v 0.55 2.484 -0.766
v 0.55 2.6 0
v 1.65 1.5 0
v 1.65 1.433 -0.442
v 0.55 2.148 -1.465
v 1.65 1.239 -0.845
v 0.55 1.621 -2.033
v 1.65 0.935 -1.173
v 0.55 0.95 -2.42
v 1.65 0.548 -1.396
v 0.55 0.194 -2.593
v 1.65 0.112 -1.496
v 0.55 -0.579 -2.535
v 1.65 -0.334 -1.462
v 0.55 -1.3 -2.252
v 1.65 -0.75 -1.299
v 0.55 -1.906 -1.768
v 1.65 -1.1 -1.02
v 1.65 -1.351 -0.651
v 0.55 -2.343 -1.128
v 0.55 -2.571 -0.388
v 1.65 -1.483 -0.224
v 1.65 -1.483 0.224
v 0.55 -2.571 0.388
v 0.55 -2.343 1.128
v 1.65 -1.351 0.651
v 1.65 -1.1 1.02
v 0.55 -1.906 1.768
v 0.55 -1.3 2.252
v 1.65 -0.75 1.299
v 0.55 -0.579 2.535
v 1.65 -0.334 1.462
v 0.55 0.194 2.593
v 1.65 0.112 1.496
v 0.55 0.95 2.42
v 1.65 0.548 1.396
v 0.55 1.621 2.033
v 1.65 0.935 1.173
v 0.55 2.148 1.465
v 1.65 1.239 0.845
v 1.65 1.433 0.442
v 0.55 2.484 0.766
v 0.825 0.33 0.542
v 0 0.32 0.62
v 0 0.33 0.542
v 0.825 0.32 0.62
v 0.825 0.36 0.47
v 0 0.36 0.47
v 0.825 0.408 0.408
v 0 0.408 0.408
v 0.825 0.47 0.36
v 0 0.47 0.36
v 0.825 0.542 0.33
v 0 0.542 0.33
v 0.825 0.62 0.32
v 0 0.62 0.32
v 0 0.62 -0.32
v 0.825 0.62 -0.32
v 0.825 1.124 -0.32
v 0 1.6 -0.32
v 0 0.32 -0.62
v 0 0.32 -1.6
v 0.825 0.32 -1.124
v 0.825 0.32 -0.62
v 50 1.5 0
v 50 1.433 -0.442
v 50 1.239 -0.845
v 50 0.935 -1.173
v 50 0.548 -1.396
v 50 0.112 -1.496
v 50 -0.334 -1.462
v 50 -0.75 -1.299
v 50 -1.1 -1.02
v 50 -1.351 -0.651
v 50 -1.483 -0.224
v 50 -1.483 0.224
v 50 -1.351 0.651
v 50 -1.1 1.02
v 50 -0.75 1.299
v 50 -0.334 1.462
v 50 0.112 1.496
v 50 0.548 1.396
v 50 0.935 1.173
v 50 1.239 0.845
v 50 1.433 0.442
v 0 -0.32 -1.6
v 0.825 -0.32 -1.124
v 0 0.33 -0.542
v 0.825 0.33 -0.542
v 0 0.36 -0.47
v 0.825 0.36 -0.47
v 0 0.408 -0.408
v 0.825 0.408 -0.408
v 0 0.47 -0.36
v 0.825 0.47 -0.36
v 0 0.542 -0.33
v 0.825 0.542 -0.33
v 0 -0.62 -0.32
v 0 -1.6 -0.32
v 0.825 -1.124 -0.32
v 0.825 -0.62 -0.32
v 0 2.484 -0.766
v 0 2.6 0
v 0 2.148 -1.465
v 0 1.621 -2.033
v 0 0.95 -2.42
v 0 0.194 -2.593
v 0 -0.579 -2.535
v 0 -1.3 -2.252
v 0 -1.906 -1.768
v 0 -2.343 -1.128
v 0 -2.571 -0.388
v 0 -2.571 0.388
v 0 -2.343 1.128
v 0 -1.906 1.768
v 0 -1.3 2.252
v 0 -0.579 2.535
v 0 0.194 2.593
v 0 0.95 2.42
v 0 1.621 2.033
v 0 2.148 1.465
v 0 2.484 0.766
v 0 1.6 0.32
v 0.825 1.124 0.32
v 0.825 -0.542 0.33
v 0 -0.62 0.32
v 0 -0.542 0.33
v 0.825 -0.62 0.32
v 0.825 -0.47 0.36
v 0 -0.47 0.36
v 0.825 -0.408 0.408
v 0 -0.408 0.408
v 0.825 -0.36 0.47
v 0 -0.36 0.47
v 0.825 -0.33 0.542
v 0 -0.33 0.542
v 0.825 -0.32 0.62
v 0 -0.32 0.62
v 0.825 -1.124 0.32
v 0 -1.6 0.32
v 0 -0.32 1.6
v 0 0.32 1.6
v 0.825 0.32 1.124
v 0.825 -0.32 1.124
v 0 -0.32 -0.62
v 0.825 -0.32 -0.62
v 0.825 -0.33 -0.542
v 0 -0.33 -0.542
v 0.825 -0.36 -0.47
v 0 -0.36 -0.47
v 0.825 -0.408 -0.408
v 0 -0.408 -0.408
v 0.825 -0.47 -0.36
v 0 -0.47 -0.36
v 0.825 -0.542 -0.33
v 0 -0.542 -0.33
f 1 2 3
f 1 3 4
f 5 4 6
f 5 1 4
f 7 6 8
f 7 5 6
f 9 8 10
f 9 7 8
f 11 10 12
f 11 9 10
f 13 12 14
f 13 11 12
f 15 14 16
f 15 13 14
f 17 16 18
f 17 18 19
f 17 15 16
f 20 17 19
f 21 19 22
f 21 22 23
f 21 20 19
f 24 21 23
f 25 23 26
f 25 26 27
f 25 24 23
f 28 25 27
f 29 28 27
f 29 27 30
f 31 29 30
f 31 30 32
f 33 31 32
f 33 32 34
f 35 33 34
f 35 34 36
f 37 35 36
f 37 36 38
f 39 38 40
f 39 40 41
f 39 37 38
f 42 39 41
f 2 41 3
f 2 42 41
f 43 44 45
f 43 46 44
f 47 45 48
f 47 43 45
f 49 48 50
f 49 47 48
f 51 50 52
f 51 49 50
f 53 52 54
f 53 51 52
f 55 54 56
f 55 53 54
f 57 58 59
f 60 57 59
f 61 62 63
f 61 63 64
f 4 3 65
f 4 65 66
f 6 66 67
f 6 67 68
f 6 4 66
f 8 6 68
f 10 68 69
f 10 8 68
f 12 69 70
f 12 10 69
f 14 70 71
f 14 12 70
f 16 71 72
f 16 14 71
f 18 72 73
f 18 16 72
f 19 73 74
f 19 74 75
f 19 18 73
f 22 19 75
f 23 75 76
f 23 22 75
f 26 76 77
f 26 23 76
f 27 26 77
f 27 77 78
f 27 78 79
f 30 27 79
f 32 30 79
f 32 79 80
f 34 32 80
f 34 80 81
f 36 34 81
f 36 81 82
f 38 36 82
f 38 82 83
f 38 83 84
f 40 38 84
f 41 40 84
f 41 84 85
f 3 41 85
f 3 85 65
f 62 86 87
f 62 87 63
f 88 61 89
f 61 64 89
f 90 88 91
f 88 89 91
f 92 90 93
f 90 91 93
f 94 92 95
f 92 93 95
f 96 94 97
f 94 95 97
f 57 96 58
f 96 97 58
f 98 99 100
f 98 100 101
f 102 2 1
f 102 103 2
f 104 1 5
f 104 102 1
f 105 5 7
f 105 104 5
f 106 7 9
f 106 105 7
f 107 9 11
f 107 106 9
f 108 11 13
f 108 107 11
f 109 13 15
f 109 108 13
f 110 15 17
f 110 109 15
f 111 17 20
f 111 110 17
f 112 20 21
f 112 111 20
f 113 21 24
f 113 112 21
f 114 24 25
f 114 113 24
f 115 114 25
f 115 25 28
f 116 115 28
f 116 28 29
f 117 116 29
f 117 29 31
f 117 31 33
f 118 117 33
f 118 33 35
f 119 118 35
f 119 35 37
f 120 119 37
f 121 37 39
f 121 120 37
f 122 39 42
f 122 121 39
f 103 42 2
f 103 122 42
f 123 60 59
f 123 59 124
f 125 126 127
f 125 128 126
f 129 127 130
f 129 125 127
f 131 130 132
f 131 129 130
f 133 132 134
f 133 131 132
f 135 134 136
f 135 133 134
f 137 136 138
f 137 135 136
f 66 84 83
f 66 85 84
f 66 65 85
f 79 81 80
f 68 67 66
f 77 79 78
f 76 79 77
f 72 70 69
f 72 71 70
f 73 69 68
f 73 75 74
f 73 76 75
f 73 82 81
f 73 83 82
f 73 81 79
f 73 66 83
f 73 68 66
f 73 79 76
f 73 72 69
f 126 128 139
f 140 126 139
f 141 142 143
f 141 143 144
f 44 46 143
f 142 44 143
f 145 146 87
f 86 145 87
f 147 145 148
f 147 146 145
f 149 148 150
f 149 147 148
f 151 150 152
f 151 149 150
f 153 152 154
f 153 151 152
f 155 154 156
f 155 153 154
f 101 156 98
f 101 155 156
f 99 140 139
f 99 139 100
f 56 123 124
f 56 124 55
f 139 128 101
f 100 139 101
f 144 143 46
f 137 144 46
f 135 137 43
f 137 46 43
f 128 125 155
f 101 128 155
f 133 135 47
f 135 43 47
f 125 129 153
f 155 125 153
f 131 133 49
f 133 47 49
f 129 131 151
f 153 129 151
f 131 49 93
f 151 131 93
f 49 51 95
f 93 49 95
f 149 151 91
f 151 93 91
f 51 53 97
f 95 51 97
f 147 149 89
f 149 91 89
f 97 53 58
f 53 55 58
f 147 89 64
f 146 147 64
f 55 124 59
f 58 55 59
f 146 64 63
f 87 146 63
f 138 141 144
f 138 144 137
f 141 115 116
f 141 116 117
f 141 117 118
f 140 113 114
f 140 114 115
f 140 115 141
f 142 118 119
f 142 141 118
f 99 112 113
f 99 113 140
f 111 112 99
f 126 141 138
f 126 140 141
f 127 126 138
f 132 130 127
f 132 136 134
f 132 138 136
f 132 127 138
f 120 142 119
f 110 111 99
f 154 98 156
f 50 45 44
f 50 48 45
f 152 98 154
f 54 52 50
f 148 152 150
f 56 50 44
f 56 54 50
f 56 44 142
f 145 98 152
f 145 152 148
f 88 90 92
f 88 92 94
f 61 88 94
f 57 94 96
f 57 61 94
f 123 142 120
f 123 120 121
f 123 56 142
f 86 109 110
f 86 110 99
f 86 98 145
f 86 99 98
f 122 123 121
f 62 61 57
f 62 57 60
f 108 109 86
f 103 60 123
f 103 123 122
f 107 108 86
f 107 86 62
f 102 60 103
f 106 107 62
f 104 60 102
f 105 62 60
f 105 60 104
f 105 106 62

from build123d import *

# Parameters (mm, degrees)
CROSSRECESS_DEPTH = 0.825
DRAFT9_ANGLE      = 30
FILLET5_R         = 0.3
SKETCH10_W        = 0.5
SKETCH10_H        = 1.5


with BuildPart() as part:
    # Sketch1 → Base (revolve)
    with BuildSketch(Plane.XY):
        Polygon((50, 1.5), (2.65, 1.5), (1.65, 1.5), (0.55, 2.6), (0, 2.6), (0, 0), (50, 0), align=None)
    revolve(axis=Axis((4.515812911, 0, 0), (-1, 0, 0)))

    # Sketch6 → CrossRecess (cut)
    with BuildSketch(Plane(origin=(0, 0, 0), x_dir=(0, 0, -1), z_dir=(1, 0, 0))):
        Polygon((0.32, 0.32), (0.32, 1.6), (-0.32, 1.6), (-0.32, 0.32), (-1.6, 0.32), (-1.6, -0.32), (-0.32, -0.32), (-0.32, -1.6), (0.32, -1.6), (0.32, -0.32), (1.6, -0.32), (1.6, 0.32), align=None)
    extrude(amount=CROSSRECESS_DEPTH, mode=Mode.SUBTRACT)

    # Draft9
    draft9_faces = [part.faces().sort_by_distance(p)[0] for p in [
        (0.4125, -1.6, 0),
        (0.4125, 0, 1.6),
        (0.4125, 0, -1.6),
        (0.4125, 1.6, 0),
    ]]
    draft(draft9_faces, Plane(origin=(0, 2.6, 0), x_dir=(0, 0, -1), z_dir=(-1, 0, 0)), DRAFT9_ANGLE)

    # Fillet5
    fillet5_edges = [part.edges().sort_by_distance(p)[0] for p in [
        (0.4125, 0.32, 0.32),
        (0.4125, -0.32, 0.32),
        (0.4125, -0.32, -0.32),
        (0.4125, 0.32, -0.32),
    ]]
    fillet(fillet5_edges, radius=FILLET5_R)

    # Sketch10 → Revolve2 (revolve)
    with BuildSketch(Plane.XY):
        with Locations((1.9, 0.75)):
            Rectangle(SKETCH10_W, SKETCH10_H)
    revolve(axis=Axis((62.228915663, 0, 0), (-1, 0, 0)))


solid = part.part
